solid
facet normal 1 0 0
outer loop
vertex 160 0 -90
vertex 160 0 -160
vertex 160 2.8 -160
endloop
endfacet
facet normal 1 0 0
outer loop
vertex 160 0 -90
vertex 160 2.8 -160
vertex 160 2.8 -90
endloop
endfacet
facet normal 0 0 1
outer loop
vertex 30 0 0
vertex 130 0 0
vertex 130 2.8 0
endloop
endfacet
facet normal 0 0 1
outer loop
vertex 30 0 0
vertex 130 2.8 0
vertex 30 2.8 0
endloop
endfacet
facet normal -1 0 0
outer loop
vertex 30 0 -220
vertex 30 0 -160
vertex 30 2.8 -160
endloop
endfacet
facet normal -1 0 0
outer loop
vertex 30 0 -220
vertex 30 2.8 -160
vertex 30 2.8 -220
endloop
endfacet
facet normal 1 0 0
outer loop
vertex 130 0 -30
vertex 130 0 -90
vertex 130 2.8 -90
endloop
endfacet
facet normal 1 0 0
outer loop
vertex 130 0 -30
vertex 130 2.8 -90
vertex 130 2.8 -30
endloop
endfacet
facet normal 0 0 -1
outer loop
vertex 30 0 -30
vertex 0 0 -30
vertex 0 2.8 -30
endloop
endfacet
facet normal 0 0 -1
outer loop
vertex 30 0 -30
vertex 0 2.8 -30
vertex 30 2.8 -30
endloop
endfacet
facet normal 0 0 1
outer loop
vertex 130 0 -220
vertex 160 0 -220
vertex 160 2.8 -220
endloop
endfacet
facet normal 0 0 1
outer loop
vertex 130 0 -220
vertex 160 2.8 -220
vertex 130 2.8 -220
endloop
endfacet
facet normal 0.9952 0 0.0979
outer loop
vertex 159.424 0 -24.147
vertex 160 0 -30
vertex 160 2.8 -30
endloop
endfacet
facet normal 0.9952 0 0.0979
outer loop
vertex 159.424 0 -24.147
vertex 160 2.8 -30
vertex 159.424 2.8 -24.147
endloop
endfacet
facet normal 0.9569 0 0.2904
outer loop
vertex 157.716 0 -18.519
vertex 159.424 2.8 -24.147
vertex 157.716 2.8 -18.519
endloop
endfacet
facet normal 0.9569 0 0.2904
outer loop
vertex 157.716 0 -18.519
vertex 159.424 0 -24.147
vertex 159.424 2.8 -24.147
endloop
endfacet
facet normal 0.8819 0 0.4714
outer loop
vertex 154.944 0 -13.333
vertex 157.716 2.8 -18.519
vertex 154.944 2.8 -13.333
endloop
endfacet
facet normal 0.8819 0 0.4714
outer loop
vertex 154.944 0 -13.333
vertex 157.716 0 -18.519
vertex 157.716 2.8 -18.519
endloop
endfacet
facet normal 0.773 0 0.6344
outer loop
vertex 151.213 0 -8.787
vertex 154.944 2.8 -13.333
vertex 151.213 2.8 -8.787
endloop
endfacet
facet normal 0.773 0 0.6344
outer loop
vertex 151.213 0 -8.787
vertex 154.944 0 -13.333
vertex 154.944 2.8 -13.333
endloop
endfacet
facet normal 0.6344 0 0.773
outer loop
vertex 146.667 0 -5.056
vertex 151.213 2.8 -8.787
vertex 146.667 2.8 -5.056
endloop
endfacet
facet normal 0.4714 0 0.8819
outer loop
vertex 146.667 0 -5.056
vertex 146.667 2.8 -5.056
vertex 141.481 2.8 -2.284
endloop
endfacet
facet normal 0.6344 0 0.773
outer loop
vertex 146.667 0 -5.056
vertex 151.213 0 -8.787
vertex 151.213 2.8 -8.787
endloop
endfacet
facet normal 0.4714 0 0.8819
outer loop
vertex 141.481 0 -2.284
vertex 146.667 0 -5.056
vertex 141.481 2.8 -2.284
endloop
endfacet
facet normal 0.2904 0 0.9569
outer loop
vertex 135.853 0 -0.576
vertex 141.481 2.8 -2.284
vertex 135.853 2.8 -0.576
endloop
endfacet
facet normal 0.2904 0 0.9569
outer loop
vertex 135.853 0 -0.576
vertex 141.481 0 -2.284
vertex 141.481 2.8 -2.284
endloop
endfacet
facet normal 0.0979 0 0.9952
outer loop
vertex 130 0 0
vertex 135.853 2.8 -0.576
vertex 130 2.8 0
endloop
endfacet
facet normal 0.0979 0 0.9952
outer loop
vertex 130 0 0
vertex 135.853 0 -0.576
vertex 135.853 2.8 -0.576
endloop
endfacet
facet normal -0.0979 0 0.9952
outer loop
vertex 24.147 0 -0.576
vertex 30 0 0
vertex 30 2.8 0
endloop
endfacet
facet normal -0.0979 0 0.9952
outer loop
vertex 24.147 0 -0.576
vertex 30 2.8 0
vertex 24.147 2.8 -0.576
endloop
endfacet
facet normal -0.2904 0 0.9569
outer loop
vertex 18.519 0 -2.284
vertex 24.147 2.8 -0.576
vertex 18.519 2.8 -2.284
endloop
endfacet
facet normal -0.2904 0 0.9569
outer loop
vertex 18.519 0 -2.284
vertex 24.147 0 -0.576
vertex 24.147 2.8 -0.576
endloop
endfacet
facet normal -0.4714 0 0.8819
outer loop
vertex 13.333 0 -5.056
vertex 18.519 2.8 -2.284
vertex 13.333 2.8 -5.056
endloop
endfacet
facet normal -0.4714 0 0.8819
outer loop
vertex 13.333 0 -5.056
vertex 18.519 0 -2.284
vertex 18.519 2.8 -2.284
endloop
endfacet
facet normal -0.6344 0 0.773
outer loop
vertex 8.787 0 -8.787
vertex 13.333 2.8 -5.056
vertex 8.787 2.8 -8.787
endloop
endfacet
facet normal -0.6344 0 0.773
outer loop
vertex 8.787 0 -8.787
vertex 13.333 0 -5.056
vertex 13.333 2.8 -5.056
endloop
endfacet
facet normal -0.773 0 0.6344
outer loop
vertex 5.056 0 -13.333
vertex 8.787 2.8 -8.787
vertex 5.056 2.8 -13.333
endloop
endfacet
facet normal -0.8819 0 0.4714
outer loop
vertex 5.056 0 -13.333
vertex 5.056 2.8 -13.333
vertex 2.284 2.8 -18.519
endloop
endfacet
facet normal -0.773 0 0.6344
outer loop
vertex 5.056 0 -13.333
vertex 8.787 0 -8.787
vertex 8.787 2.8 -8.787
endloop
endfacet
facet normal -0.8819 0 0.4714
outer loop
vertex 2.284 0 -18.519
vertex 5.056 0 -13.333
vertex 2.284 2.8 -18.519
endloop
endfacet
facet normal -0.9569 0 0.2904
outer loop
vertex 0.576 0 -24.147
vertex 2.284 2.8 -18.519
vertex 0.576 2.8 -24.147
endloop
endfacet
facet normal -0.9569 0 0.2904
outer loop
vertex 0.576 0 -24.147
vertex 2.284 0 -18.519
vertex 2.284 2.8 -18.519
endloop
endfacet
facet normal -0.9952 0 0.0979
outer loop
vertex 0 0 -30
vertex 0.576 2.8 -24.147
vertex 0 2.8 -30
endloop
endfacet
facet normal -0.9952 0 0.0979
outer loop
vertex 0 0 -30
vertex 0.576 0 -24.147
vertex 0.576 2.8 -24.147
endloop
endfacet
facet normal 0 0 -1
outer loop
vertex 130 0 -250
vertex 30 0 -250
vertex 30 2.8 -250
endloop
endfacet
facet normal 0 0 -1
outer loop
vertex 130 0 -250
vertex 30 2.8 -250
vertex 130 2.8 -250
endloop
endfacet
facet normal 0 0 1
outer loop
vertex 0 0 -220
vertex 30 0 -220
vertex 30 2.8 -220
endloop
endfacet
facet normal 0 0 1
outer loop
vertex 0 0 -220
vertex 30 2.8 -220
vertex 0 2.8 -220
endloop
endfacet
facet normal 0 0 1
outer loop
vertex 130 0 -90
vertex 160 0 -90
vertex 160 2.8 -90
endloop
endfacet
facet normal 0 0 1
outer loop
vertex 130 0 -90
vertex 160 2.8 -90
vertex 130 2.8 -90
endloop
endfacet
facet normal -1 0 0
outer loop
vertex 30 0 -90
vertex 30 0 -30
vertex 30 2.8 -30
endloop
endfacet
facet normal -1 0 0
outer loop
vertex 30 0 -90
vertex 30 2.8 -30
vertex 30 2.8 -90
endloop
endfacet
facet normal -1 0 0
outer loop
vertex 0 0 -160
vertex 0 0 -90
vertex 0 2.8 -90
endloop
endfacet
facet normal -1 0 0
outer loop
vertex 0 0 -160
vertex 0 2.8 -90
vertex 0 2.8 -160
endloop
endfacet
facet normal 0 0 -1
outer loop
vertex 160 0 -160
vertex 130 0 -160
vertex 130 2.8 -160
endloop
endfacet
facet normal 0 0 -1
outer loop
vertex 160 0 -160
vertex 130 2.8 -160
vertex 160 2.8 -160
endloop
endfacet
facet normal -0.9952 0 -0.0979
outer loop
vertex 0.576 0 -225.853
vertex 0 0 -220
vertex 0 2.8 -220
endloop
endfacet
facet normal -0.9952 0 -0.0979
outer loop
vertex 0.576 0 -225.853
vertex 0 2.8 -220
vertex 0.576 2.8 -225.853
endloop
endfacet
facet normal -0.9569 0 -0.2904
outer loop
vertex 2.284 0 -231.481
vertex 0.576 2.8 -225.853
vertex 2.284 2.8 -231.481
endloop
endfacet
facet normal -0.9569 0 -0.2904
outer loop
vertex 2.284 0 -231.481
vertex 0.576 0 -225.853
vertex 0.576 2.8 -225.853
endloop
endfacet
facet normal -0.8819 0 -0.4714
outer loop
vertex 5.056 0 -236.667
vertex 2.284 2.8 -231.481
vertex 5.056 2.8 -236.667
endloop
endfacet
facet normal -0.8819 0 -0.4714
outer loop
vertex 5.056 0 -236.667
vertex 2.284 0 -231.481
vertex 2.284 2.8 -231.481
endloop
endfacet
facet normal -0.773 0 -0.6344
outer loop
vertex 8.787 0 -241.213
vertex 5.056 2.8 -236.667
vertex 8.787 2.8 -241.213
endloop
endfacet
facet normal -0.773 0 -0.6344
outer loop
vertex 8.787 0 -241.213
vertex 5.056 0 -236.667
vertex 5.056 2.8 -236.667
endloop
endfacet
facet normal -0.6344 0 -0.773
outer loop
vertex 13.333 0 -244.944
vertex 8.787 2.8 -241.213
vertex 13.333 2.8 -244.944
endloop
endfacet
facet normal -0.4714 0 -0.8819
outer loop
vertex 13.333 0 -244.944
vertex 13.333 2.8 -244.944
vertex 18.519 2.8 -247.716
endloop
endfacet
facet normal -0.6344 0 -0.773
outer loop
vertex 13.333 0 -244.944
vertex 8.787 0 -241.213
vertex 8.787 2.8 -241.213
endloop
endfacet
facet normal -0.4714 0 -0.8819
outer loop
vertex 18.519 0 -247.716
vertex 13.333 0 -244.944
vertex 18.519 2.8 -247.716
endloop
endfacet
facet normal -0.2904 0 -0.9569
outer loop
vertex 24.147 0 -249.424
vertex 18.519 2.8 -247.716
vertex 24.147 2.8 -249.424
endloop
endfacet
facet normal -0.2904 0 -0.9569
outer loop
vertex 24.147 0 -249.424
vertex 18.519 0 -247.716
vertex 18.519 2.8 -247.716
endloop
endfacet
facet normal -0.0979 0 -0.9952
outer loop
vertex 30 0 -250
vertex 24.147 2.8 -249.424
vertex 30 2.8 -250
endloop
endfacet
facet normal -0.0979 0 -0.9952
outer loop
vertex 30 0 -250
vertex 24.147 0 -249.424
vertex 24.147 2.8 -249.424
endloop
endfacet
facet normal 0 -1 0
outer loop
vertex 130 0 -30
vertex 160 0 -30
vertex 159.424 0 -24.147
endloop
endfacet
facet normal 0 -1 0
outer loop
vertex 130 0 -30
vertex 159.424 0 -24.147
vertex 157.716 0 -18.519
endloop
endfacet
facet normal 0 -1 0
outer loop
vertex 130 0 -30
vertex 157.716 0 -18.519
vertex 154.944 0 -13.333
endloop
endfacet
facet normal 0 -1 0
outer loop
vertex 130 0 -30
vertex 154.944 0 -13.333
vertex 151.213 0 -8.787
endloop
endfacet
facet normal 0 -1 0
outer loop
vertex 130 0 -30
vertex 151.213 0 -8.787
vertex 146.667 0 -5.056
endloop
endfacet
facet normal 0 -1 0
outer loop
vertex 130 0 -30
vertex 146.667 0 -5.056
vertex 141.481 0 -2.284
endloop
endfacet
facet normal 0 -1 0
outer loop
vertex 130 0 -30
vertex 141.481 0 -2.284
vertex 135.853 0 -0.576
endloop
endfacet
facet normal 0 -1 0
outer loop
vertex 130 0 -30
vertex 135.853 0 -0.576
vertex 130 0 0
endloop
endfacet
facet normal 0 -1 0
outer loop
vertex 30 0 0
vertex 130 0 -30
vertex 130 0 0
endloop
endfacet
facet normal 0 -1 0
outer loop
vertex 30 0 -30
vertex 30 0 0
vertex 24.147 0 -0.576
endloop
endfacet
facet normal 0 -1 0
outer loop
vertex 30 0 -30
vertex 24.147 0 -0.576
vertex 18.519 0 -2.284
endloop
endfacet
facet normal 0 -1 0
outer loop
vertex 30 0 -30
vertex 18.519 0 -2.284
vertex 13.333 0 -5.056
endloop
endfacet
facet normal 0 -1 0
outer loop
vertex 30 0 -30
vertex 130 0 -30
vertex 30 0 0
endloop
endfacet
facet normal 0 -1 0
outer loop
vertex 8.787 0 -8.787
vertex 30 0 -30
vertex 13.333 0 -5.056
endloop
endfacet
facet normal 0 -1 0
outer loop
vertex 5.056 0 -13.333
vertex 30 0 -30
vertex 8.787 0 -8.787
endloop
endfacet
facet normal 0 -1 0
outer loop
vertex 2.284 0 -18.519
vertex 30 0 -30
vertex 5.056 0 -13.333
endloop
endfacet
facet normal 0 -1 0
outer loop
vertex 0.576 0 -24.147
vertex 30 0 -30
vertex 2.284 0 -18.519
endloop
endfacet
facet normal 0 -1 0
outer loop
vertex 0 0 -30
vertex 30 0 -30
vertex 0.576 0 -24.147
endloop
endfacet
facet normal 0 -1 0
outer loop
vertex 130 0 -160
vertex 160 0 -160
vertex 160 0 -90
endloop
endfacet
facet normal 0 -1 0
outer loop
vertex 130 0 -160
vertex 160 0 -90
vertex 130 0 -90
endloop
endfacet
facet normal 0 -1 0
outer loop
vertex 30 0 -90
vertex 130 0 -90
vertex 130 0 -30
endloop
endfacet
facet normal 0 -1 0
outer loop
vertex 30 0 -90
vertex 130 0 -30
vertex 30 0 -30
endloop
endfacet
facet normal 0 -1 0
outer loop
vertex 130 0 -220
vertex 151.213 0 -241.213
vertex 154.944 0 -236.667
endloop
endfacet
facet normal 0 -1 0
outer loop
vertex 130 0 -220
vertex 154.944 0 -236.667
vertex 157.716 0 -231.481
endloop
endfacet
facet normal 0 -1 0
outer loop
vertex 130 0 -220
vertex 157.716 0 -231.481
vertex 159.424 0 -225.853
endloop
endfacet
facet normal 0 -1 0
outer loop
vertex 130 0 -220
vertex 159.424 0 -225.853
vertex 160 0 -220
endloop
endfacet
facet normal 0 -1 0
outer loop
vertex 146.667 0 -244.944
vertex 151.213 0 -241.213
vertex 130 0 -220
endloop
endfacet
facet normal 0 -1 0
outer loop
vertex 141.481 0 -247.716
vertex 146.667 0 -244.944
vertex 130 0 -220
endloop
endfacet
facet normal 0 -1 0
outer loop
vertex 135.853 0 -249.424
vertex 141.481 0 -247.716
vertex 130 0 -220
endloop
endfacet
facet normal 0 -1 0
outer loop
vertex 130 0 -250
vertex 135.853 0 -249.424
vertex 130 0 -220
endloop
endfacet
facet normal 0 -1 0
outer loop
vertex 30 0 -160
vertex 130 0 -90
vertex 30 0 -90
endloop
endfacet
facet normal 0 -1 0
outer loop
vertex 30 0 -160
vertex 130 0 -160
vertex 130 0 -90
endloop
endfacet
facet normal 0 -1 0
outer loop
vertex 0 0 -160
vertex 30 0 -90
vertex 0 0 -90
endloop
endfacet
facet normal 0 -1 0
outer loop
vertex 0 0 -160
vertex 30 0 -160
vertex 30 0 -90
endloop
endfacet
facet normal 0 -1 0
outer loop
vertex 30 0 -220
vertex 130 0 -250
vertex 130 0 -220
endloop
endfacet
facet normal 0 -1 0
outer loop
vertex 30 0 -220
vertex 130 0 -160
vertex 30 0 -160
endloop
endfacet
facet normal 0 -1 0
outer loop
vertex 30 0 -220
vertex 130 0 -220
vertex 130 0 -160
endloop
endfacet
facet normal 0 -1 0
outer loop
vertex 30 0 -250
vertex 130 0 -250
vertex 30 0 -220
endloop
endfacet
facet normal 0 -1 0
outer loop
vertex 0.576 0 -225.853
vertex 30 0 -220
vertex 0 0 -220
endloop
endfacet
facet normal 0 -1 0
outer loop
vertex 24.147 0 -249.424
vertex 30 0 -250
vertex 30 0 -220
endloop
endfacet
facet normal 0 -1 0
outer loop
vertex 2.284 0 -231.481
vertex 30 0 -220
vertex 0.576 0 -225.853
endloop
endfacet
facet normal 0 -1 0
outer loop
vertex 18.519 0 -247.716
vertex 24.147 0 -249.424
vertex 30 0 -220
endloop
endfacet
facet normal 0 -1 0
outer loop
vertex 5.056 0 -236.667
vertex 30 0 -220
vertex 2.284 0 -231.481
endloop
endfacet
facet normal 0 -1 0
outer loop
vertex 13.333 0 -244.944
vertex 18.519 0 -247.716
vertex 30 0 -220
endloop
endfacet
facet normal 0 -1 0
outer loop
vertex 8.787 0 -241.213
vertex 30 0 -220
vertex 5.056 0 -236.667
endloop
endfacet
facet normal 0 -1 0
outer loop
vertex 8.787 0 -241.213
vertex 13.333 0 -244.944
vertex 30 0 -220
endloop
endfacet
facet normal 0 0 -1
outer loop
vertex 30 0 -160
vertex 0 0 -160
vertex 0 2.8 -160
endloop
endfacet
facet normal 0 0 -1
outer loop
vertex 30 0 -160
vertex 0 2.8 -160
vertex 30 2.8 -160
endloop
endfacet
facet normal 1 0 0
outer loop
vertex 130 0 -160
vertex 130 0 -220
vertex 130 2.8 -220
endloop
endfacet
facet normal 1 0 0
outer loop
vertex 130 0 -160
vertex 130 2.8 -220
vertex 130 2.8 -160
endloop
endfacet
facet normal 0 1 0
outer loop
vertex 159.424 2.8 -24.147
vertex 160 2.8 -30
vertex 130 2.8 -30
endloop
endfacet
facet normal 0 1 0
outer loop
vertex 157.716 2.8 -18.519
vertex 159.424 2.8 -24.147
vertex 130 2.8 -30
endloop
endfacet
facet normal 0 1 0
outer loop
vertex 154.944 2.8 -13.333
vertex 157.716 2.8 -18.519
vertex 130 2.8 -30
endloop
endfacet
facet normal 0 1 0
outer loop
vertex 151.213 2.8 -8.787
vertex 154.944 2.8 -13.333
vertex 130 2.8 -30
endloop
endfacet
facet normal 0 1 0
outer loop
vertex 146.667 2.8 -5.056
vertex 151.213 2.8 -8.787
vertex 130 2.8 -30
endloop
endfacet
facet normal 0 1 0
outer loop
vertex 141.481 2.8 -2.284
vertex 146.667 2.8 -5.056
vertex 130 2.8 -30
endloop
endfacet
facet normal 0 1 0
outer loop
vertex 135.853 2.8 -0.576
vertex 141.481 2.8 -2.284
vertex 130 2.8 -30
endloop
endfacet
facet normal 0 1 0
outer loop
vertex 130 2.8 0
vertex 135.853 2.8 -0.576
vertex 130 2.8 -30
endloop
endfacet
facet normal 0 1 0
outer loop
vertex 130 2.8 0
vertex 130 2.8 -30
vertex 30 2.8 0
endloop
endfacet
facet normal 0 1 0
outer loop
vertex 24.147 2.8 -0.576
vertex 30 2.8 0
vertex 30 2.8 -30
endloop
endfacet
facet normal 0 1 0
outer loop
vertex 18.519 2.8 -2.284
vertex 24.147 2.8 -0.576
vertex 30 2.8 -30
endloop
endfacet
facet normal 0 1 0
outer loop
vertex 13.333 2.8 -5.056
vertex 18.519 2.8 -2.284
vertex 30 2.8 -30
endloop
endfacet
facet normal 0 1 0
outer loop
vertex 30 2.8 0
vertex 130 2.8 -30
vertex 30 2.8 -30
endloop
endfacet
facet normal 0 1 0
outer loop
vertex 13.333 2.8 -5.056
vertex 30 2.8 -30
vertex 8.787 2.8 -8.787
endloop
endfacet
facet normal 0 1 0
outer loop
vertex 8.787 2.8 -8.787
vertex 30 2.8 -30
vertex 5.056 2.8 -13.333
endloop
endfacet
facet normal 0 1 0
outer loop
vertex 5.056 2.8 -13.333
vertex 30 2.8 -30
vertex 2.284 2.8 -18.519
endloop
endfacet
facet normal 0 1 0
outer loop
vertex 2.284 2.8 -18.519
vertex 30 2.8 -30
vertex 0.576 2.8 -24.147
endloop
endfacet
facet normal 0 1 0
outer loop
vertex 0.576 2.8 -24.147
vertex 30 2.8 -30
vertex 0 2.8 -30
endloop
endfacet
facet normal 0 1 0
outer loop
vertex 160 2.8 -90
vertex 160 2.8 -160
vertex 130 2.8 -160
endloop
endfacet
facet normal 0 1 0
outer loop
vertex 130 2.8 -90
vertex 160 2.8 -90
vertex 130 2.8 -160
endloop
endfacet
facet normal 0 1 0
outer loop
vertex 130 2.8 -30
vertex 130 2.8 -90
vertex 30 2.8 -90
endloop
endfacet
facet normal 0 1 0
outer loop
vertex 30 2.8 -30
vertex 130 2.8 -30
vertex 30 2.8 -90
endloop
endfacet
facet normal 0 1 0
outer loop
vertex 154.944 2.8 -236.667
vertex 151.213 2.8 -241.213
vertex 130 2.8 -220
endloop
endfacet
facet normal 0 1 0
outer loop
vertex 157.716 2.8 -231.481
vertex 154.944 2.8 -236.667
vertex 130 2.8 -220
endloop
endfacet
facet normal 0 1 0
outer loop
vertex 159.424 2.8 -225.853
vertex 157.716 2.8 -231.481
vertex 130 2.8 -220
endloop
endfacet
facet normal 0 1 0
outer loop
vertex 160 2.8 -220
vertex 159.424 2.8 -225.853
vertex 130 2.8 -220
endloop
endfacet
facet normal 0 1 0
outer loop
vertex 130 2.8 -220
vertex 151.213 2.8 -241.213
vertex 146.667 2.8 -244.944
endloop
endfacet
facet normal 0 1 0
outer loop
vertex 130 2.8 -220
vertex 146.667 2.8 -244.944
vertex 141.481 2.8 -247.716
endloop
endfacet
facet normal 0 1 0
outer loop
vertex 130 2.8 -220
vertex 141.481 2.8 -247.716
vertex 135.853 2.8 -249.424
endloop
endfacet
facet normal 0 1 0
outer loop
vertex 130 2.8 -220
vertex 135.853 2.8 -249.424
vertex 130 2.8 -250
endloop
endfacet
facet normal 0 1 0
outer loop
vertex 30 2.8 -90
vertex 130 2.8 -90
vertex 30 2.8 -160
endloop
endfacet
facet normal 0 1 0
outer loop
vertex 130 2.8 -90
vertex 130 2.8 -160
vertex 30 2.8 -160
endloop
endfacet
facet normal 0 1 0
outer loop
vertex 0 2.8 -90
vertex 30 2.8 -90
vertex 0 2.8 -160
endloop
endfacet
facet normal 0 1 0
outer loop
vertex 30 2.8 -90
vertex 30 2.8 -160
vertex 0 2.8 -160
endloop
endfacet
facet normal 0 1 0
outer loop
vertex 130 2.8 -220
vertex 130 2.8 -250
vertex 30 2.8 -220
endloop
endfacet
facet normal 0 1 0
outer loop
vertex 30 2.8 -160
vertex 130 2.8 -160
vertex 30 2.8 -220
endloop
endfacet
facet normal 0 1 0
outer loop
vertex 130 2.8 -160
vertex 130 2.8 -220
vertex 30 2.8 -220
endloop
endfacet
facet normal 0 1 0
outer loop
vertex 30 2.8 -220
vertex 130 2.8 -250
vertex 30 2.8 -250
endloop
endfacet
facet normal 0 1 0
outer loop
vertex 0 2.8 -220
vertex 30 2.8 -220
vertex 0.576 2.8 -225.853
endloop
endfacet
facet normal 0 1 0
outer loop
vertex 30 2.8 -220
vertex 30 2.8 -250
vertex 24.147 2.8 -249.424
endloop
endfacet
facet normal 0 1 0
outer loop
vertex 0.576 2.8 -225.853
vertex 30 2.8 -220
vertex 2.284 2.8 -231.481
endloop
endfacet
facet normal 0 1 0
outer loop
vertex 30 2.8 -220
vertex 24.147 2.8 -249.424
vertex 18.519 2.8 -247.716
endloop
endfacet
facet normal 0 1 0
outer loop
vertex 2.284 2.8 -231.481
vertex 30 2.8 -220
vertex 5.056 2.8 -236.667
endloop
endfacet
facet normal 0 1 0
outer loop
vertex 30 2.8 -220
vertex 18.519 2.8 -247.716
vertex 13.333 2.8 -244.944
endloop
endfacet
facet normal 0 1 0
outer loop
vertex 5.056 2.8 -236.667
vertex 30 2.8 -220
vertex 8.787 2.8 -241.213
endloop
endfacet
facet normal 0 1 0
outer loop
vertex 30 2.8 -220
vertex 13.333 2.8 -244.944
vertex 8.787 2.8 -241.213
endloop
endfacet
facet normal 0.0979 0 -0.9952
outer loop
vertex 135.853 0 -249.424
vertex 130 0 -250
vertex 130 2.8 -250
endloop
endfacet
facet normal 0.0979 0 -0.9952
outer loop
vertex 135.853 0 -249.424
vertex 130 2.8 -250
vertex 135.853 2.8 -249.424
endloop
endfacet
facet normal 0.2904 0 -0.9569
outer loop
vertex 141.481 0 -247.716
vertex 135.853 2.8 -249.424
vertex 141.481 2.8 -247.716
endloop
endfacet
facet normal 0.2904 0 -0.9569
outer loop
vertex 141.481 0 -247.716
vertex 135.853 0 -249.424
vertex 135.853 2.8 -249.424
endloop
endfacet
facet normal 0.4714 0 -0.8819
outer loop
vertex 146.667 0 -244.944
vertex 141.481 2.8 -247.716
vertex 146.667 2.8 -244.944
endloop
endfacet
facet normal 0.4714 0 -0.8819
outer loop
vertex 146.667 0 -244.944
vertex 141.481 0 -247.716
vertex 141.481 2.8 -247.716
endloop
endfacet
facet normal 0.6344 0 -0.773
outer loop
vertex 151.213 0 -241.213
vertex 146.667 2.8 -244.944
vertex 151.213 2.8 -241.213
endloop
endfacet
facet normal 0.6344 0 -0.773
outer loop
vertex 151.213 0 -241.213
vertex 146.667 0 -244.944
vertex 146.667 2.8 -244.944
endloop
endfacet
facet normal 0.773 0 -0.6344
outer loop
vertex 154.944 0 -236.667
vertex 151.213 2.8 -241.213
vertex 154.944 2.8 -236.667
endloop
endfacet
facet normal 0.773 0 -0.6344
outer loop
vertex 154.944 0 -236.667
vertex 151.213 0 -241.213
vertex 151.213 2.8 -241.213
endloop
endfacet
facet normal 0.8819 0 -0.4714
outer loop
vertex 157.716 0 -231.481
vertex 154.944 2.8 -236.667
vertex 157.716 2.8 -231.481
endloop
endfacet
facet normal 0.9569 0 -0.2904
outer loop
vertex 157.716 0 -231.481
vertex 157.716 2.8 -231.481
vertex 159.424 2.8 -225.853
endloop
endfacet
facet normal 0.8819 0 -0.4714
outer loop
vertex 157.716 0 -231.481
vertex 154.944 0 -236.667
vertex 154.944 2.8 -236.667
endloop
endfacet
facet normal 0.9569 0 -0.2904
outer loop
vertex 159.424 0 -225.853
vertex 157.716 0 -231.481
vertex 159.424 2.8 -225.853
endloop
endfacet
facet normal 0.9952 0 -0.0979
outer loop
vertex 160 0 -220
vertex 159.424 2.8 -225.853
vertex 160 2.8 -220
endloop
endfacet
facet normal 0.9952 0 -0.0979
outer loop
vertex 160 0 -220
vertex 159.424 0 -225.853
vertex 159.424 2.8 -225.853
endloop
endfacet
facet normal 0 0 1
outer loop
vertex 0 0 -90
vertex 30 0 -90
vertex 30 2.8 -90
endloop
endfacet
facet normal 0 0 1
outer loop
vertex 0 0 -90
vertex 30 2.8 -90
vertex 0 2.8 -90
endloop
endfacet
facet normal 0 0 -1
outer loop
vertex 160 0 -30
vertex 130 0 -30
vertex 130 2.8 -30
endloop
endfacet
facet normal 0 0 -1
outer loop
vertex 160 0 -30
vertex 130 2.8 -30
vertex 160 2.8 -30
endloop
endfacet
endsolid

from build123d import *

# Parameters (mm, degrees)
BOSS_EXTRUDE1_DEPTH = 2.8


with BuildPart() as part:
    # Sketch1 → Boss-Extrude1 (new body)
    with BuildSketch(Plane(origin=(0, 0, 0), x_dir=(1, 0, 0), z_dir=(0, 1, 0))):
        with BuildLine():
            Line((0, 30), (30, 30))
            Line((30, 30), (30, 90))
            Line((30, 90), (0, 90))
            Line((0, 90), (0, 160))
            Line((0, 160), (30, 160))
            Line((30, 160), (30, 220))
            Line((30, 220), (0, 220))
            ThreePointArc((0, 220), (8.786796564, 241.213203436), (30, 250))
            Line((30, 250), (130, 250))
            ThreePointArc((130, 250), (151.213203436, 241.213203436), (160, 220))
            Line((160, 220), (130, 220))
            Line((130, 220), (130, 160))
            Line((130, 160), (160, 160))
            Line((160, 160), (160, 90))
            Line((160, 90), (130, 90))
            Line((130, 90), (130, 30))
            Line((130, 30), (160, 30))
            ThreePointArc((160, 30), (151.213203436, 8.786796564), (130, 0))
            Line((130, 0), (30, 0))
            ThreePointArc((30, 0), (8.786796564, 8.786796564), (0, 30))
        make_face()
    extrude(amount=BOSS_EXTRUDE1_DEPTH)


solid = part.part
